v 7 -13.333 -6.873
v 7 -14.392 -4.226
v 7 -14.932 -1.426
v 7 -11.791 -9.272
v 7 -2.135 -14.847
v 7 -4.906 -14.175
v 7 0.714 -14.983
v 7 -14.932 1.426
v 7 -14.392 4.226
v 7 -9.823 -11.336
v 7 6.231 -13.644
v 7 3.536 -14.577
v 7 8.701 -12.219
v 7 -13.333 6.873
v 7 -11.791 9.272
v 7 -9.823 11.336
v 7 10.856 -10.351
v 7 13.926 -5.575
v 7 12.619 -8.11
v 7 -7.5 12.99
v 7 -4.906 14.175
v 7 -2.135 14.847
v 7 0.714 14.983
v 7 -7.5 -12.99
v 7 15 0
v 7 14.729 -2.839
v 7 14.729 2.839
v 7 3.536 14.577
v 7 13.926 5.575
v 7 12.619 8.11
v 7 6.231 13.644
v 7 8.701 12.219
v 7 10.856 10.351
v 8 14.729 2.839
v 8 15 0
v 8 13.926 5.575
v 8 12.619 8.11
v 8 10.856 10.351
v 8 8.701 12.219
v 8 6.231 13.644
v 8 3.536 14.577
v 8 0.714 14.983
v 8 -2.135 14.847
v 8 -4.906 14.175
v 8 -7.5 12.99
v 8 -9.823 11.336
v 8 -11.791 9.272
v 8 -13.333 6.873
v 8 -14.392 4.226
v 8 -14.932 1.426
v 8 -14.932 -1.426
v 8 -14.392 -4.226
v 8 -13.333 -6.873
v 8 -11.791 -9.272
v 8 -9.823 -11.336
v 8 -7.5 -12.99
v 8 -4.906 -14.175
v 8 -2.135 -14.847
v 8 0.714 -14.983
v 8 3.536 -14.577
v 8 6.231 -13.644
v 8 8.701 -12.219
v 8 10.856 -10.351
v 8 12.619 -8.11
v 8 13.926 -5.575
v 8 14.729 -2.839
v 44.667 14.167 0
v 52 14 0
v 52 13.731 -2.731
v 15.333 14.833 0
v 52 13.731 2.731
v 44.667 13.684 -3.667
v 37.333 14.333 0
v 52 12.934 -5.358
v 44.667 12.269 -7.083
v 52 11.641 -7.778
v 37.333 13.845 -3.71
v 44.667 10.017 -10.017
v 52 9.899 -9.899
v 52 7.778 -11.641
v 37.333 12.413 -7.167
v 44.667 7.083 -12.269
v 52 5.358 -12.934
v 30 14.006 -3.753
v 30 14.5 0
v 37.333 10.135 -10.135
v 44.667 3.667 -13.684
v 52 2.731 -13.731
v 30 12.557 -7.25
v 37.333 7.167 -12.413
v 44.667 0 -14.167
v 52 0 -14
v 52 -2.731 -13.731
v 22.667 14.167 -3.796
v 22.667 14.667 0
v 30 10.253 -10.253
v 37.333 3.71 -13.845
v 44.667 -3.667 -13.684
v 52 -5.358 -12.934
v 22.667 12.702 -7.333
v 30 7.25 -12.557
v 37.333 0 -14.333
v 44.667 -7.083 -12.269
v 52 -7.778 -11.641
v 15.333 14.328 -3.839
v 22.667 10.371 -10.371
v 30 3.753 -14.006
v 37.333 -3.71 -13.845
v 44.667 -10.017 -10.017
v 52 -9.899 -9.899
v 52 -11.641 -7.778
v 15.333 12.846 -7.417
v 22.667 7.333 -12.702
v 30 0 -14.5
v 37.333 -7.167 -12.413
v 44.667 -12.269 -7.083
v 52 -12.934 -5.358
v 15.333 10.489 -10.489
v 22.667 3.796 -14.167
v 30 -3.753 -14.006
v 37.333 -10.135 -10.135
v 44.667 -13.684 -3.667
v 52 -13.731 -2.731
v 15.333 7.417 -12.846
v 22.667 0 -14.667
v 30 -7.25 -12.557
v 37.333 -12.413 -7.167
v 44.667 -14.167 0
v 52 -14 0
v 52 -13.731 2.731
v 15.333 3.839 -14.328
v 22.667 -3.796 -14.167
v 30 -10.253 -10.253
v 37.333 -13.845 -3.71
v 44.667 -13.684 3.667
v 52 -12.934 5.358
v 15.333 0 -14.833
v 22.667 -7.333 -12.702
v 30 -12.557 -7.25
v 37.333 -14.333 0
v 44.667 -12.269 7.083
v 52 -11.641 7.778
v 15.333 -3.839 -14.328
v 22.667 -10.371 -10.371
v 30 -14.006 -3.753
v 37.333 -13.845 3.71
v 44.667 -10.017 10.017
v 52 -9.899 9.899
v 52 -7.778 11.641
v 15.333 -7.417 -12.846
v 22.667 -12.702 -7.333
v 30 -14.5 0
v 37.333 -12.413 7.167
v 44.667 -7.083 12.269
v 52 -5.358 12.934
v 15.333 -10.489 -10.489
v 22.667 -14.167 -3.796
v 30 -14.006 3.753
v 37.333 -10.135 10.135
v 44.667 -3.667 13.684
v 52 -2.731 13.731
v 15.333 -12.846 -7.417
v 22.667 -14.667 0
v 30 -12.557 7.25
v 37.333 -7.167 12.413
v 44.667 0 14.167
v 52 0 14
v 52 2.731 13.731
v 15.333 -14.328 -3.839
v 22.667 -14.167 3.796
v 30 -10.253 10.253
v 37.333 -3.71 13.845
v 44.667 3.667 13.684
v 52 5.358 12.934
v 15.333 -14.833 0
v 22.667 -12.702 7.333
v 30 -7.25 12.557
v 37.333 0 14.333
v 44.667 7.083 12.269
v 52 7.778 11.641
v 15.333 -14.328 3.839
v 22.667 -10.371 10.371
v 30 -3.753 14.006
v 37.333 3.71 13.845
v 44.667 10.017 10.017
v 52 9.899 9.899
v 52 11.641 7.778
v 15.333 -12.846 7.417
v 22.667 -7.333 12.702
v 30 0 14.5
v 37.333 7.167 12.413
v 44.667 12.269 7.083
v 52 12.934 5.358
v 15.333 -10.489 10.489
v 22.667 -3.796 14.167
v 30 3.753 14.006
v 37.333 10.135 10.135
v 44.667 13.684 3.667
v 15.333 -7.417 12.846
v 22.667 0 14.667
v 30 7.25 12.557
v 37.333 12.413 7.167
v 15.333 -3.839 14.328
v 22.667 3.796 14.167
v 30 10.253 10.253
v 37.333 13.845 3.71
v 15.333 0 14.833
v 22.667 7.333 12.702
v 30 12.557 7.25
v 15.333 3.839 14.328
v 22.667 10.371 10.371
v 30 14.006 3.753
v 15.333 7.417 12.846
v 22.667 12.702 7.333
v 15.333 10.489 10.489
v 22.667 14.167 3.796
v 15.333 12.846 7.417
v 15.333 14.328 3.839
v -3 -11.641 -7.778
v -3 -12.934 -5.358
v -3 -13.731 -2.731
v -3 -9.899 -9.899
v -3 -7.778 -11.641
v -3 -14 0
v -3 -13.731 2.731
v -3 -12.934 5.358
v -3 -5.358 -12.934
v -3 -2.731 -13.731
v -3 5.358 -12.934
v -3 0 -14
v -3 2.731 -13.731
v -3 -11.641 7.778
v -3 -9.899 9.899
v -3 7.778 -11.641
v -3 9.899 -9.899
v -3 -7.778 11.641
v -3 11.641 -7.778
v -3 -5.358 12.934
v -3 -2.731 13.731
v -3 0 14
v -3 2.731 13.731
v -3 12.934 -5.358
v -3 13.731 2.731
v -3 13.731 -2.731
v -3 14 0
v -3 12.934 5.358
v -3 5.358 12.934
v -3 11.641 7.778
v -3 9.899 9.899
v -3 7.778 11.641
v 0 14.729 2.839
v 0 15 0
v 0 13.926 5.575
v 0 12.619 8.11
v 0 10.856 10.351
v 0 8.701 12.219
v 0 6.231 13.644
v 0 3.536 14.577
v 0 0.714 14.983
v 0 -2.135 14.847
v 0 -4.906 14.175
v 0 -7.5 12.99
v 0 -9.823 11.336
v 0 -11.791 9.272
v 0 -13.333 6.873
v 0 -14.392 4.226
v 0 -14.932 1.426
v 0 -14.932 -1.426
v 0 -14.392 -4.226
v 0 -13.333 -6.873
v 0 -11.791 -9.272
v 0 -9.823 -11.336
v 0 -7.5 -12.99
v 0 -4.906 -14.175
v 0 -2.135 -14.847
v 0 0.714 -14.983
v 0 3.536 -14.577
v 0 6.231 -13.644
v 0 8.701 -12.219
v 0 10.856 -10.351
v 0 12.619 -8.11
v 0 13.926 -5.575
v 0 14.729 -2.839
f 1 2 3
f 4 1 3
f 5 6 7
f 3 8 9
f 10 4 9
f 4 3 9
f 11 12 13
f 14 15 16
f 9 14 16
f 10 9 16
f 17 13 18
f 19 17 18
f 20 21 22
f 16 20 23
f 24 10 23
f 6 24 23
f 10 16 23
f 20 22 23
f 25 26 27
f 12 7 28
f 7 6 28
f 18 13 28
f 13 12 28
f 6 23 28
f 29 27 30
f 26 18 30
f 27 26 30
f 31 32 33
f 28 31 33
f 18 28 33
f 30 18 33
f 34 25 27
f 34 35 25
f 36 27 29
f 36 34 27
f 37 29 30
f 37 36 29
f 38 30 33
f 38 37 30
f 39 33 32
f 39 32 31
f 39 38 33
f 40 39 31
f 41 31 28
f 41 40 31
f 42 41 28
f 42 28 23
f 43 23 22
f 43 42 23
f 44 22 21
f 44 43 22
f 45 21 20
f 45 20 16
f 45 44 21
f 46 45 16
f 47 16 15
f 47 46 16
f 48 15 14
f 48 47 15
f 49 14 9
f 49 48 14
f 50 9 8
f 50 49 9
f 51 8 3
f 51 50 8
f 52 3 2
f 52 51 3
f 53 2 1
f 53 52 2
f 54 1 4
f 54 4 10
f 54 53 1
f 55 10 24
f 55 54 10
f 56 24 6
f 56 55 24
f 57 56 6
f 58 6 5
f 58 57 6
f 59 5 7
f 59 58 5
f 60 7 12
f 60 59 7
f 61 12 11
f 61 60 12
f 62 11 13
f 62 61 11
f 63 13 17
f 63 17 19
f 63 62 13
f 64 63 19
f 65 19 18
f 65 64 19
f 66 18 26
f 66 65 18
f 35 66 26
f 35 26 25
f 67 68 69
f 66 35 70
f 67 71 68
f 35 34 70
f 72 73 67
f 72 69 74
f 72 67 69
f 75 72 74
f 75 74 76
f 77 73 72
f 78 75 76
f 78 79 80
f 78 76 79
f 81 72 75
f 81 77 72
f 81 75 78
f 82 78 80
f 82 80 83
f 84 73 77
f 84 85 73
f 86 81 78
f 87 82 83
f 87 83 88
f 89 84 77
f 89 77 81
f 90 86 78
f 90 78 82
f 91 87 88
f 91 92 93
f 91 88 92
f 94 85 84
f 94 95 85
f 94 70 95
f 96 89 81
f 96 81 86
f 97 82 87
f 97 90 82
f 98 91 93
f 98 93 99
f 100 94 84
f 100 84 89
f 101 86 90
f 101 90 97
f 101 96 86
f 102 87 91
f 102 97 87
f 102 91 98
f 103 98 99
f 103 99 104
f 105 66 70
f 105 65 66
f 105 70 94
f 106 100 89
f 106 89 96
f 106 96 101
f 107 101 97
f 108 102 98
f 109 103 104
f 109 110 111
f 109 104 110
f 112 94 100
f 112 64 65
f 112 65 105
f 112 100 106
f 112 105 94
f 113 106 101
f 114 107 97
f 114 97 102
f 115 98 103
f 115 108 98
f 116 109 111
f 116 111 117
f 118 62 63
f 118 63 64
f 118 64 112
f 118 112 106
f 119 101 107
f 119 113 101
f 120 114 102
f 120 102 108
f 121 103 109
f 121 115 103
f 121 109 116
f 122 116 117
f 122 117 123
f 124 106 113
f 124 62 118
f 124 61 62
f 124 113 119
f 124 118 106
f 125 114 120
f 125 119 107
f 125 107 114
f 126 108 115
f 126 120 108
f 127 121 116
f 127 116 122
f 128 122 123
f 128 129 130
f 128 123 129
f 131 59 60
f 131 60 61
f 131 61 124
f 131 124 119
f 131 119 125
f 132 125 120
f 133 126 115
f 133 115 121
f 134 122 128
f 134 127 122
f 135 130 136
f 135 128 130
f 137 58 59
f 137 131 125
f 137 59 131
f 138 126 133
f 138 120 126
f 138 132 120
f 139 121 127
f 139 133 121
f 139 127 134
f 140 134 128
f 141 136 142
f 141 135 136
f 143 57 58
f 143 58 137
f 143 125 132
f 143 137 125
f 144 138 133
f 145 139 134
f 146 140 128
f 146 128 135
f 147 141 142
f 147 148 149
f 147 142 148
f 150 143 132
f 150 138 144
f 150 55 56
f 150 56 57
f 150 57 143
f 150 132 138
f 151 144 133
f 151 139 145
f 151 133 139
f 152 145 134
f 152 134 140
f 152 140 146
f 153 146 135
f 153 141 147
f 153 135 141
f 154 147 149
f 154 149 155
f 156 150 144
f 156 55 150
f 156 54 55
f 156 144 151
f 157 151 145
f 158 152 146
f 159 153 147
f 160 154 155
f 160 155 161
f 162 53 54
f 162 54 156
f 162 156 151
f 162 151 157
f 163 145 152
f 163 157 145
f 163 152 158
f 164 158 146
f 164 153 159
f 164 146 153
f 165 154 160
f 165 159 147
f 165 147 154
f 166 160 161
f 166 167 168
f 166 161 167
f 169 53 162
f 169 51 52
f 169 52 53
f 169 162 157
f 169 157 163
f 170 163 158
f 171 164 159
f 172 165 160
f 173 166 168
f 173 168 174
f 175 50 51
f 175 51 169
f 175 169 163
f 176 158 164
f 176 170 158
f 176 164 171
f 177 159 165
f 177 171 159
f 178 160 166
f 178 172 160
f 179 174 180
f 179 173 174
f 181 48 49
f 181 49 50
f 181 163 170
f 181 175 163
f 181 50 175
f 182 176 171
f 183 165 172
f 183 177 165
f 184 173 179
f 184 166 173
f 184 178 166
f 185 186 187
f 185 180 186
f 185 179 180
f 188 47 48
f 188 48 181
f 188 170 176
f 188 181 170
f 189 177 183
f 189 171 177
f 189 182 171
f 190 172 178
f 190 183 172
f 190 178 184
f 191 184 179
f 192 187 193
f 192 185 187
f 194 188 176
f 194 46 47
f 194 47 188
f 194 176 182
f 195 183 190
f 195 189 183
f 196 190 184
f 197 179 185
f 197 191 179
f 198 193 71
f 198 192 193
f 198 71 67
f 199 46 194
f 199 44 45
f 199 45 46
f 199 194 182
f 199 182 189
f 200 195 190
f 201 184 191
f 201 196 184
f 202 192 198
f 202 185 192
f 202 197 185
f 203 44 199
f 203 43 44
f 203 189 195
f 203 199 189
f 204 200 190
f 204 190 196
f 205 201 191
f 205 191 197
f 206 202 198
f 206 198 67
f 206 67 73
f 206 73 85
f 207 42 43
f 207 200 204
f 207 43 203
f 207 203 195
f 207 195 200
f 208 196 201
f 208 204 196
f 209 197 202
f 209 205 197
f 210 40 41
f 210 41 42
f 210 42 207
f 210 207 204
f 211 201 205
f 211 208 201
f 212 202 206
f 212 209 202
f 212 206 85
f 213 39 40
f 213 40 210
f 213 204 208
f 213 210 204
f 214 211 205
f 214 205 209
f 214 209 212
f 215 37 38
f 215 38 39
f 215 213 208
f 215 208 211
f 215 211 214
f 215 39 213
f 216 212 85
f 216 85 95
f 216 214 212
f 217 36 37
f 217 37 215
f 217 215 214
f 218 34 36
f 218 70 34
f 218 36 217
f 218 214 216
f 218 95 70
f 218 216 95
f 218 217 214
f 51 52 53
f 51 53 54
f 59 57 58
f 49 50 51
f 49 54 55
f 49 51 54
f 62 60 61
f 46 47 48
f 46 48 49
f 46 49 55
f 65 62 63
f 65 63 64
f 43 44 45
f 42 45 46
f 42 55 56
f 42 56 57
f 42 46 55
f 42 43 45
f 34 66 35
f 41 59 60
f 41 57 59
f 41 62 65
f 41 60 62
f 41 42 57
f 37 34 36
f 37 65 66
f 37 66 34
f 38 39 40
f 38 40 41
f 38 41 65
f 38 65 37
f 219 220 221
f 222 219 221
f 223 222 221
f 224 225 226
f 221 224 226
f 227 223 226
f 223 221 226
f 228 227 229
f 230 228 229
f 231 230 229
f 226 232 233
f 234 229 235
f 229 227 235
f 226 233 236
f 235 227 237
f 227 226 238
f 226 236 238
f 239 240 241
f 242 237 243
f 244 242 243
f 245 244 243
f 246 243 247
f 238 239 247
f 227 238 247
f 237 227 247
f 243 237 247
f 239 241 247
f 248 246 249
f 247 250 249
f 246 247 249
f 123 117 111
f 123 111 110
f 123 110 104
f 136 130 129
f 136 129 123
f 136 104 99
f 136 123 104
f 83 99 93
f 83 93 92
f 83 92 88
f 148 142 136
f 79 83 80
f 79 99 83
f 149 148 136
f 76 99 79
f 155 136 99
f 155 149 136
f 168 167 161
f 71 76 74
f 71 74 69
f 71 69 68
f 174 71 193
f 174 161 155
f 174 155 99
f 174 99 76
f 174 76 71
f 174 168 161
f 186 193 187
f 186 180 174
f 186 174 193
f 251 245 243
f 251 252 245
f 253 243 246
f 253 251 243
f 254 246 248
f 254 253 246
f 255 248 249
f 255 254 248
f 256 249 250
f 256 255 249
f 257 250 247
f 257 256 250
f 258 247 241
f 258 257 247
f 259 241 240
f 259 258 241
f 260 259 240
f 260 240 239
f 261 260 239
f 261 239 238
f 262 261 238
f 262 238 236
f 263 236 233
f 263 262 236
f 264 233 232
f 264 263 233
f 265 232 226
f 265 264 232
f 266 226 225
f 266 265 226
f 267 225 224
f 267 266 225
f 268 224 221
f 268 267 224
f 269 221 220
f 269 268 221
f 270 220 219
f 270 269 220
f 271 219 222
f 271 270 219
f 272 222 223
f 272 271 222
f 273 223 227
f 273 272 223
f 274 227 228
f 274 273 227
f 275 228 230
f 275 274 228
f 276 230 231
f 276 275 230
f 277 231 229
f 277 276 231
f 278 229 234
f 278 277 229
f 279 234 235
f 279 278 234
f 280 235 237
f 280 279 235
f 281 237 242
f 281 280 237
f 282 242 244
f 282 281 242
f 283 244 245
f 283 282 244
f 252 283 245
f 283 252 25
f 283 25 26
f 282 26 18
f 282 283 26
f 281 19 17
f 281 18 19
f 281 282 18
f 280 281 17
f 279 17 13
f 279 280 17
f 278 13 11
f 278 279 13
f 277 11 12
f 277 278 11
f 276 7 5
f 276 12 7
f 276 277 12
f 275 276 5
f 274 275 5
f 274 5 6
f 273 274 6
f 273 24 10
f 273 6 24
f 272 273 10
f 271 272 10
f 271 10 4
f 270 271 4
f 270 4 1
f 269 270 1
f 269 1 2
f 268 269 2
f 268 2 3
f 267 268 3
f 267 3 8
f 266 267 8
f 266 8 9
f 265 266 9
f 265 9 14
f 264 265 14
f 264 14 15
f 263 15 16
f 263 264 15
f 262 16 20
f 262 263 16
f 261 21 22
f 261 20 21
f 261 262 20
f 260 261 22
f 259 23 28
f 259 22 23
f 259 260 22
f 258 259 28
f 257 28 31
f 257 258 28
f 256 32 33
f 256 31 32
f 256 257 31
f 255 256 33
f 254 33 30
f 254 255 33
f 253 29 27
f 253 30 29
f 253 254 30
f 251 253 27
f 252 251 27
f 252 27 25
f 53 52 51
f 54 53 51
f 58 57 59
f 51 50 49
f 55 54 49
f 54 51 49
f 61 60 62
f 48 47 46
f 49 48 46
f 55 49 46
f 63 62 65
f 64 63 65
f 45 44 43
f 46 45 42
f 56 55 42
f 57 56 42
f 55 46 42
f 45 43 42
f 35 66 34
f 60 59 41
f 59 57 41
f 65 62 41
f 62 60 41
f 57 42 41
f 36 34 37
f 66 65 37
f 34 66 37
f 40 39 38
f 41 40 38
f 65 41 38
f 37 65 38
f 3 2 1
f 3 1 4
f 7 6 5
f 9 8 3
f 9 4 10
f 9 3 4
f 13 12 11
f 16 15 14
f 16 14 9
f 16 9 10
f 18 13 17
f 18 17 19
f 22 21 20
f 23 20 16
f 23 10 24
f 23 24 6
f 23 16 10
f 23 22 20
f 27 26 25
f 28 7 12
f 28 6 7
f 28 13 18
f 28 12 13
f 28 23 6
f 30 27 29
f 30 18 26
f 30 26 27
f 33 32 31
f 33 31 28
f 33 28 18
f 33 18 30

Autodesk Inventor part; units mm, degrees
sketch "スケッチ1" plane through (0, 0, 0) normal (1, 0, 0) x (0, 1, 0)
  circle A0 centre (0, 0) radius 15
  point P0 (15, 0)
  dimension "d0" = 30
ref_plane "作業平面1" through (52, 0, 0) normal (1, 0, 0) x (0, 1, 0)
sketch "スケッチ2" plane through (52, 0, 0) normal (1, 0, 0) x (0, 1, 0)
  circle A0 centre (0, 0) radius 14
  line L0 (-12.3996, 6.5) -> (-12.3996, -6.5)
  dimension "d2" = 28
  dimension "d36" = 13
ref_plane "作業平面2" through (-3, 0, 0) normal (1, 0, 0) x (0, 1, 0)
sketch "スケッチ3" plane through (-3, 0, 0) normal (1, 0, 0) x (0, 1, 0)
  circle A0 centre (0, 0) radius 14
  dimension "d4" = 28
ref_plane "作業平面3" through (0, 0, 0) normal (0, 0, -1) x (0, 1, 0)
ref_plane "作業平面5" through (8, 0, 0) normal (1, 0, 0) x (0, 1, 0)
ref_plane "作業平面4" through (7, 0, 0) normal (1, 0, 0) x (0, 1, 0)
sketch "スケッチ5" plane through (7, 0, 0) normal (1, 0, 0) x (0, 1, 0)
  circle A0 centre (0, 0) radius 15
  dimension "d20" = 30
sketch "スケッチ6" plane through (8, 0, 0) normal (1, 0, 0) x (0, 1, 0)
  circle A0 centre (0, 0) radius 15
  dimension "d21" = 30
loft "ロフト3" add profiles "スケッチ5", "スケッチ6"
extrude "押し出し1" add sketch "スケッチ1" along normal up to surface (7 mm away) separate body
loft "ロフト4" add profiles "スケッチ3" bodies 2 section 2 edges at (0, -15, 0)
loft "ロフト5" add profiles "スケッチ2" separate body section 2 edges at (8, -15, 0)
properties part number "3.2MEGA-PIXELS-WEBCAMERA" material "アルミニウム 6061"
